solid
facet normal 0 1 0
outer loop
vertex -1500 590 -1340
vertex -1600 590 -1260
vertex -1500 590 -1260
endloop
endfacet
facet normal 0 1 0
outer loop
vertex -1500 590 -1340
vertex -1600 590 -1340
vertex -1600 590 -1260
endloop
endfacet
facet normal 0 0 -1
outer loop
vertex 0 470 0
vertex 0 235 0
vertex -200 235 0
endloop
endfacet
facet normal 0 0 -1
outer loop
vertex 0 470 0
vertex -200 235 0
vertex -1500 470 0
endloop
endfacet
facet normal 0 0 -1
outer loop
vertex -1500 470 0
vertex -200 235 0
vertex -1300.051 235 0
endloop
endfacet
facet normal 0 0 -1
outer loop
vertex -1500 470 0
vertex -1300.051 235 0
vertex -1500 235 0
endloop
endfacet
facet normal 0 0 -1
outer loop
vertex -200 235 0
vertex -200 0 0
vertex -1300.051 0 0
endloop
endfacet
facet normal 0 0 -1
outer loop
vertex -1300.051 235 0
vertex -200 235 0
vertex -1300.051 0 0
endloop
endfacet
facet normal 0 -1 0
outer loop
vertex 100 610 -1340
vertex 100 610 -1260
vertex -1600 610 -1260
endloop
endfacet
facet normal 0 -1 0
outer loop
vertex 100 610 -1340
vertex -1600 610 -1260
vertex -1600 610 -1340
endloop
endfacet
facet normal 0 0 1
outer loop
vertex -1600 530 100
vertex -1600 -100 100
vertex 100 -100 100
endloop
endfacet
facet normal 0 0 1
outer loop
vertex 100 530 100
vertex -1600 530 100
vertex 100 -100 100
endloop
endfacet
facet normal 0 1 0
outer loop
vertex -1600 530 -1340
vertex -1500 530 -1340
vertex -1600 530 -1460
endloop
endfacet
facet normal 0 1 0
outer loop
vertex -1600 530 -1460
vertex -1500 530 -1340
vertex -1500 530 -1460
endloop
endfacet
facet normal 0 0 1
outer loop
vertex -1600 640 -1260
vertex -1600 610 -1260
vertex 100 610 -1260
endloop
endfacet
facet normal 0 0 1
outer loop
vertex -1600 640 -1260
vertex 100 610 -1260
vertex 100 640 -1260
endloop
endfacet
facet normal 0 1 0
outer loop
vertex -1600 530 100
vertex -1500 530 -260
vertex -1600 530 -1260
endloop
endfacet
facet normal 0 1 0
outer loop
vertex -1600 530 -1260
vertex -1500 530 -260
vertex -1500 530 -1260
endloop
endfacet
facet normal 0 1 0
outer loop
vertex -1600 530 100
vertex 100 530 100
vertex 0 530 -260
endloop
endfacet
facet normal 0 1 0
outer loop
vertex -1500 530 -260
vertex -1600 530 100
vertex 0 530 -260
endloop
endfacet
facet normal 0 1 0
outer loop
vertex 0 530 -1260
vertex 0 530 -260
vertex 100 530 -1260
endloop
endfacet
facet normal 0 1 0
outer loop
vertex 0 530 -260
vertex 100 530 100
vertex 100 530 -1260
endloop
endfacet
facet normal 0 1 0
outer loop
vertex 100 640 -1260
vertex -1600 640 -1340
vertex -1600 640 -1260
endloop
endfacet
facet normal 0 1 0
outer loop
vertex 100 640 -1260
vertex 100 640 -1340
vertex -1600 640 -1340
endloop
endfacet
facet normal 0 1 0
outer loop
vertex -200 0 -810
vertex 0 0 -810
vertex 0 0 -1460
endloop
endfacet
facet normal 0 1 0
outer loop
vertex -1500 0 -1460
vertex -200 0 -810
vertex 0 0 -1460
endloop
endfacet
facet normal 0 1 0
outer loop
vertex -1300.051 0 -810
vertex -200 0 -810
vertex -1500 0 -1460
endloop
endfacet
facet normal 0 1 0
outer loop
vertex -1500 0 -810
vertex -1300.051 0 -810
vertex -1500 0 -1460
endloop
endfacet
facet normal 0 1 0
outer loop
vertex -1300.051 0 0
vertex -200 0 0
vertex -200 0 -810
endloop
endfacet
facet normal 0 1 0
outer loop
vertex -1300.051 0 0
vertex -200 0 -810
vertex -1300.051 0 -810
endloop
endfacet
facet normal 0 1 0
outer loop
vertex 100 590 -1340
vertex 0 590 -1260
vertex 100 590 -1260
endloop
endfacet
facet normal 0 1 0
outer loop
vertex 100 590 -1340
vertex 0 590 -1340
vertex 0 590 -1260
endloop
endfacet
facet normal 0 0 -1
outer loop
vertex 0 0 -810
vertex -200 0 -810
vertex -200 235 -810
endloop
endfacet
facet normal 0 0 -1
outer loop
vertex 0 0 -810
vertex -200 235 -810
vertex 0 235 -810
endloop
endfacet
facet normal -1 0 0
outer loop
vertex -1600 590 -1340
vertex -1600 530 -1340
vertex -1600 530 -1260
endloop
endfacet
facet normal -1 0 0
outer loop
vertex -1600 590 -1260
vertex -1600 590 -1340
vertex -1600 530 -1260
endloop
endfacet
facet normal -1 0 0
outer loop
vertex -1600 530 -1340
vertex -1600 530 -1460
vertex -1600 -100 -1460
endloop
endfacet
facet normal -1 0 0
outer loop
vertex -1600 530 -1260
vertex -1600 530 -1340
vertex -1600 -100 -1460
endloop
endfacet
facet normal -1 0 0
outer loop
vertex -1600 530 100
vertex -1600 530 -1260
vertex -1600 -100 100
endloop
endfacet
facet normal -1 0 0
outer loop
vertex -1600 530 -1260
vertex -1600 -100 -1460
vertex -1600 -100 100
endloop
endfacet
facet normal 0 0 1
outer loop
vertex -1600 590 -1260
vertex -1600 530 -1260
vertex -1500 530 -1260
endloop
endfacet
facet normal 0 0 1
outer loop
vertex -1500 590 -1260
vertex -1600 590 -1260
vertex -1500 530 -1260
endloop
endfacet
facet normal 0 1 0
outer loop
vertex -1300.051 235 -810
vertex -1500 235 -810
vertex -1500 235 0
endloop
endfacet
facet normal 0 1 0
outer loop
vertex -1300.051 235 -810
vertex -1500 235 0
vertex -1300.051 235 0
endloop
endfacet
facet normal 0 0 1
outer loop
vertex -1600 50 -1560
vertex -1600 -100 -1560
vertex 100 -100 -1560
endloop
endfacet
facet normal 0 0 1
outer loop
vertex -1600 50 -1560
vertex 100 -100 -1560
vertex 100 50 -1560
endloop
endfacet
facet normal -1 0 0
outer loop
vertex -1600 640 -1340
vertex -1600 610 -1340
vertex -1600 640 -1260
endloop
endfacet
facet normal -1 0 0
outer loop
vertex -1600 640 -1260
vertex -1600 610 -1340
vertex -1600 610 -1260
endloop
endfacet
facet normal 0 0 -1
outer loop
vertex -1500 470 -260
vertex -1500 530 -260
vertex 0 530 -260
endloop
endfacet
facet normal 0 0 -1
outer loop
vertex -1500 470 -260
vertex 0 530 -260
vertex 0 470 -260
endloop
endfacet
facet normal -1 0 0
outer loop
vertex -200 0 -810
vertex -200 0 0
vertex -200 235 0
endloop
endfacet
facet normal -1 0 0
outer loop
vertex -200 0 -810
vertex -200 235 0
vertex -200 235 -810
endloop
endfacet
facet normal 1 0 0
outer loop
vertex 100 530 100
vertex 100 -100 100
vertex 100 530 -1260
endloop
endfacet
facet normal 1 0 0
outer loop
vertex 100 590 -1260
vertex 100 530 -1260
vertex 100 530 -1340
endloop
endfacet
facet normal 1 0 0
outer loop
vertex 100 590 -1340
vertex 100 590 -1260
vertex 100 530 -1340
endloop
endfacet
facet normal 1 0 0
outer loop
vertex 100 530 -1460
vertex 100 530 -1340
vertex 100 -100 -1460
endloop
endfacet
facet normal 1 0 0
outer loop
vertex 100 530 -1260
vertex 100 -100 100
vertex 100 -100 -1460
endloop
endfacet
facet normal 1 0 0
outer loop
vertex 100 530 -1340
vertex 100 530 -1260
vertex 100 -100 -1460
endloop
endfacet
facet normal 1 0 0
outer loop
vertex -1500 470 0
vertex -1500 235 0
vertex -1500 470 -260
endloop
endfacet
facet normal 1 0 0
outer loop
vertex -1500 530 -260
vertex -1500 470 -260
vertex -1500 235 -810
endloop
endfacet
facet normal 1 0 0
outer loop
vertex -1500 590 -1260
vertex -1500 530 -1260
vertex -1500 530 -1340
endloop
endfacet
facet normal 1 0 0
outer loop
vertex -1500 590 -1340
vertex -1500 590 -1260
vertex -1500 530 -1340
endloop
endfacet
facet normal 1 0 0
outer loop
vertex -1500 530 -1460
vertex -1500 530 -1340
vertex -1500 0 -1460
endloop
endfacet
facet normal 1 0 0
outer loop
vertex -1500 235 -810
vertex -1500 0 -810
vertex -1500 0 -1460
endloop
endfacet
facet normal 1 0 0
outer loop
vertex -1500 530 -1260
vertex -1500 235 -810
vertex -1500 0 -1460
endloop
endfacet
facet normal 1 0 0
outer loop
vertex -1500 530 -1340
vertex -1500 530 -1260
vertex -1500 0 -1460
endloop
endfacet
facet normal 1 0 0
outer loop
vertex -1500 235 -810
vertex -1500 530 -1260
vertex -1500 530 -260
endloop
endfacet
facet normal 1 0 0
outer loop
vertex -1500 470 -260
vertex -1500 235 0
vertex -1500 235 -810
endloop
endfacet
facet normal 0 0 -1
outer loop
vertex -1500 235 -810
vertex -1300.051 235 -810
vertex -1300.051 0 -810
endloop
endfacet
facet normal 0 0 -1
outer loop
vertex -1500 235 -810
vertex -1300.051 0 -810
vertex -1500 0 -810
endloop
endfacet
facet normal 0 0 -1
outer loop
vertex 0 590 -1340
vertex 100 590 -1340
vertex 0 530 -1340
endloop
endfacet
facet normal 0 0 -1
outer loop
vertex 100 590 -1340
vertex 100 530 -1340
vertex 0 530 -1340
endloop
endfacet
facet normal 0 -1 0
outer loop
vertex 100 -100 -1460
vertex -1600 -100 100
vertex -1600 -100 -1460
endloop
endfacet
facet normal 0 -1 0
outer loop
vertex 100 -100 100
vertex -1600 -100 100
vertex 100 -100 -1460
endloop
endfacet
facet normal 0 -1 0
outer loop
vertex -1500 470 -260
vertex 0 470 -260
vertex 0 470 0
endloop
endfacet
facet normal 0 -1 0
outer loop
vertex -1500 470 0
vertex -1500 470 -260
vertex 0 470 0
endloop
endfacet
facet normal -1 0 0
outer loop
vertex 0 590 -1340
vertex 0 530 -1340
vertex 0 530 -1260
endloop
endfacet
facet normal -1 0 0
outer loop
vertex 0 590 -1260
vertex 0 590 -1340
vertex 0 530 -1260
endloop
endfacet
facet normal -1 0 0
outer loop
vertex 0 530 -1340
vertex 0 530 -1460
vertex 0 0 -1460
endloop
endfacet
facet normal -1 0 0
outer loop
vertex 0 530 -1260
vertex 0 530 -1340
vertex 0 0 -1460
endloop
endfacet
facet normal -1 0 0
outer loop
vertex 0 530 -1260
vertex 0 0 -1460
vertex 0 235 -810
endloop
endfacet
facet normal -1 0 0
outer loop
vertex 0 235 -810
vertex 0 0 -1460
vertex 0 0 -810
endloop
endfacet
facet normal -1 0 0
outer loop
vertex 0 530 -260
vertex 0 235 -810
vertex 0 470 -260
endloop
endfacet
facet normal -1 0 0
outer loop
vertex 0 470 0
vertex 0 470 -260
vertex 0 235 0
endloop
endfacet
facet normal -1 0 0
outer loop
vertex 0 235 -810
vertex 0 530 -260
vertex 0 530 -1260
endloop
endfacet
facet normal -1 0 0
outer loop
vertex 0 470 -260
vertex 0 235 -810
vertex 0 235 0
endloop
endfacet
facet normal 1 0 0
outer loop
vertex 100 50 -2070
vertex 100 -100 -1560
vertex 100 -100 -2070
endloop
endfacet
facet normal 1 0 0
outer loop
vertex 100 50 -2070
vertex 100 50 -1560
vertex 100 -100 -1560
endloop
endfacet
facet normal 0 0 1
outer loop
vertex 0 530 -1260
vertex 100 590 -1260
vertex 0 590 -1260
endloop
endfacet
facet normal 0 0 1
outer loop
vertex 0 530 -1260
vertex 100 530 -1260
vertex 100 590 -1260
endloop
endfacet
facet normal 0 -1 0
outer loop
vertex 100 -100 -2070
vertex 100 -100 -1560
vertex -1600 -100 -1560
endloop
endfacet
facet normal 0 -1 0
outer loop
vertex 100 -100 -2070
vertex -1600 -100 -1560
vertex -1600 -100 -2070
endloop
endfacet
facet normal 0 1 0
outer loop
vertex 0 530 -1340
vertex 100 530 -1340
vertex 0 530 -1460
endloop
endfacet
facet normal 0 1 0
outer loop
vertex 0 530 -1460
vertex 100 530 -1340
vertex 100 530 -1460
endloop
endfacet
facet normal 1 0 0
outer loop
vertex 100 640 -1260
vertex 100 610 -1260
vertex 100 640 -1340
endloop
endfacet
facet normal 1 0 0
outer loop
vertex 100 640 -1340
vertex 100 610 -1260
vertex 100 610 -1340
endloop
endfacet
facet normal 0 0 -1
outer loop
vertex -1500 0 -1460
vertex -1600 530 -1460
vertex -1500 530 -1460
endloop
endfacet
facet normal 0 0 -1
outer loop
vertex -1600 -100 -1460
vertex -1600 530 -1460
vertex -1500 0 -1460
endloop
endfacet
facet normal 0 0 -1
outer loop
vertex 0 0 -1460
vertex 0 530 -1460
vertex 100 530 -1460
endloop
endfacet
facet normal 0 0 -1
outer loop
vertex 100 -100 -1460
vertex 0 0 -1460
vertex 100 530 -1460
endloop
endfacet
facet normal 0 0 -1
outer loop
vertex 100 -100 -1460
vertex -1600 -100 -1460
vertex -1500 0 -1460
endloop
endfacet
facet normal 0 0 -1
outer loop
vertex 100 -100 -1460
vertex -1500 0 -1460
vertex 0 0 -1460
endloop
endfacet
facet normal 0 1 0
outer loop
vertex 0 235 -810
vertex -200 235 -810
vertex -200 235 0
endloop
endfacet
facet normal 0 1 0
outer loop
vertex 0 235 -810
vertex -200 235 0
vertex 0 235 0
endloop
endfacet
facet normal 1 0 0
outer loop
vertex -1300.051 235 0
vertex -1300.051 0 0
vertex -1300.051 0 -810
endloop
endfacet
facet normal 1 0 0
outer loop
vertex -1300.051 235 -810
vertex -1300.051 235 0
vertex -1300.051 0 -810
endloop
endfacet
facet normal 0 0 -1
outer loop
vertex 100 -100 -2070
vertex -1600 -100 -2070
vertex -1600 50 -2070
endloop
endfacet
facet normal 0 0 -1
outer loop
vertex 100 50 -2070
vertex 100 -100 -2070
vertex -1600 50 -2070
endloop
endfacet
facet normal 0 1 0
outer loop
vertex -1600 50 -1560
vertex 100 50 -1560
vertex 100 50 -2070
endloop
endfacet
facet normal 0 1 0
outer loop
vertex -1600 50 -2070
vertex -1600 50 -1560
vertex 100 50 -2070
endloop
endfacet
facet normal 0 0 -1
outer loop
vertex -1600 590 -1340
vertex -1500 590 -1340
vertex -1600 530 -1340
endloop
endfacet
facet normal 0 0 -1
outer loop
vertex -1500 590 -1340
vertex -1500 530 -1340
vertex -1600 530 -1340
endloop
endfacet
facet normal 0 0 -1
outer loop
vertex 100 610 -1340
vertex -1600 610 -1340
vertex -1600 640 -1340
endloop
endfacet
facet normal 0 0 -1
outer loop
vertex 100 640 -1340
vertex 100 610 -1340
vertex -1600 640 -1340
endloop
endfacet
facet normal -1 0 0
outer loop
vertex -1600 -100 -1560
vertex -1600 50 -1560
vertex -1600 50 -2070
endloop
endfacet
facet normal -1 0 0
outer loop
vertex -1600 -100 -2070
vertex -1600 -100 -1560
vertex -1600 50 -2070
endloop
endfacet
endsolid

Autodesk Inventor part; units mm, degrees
ref_plane "YZ Plane" through (0, 0, 0) normal (1, 0, 0) x (0, 1, 0)
ref_plane "XZ Plane" through (0, 0, 0) normal (0, 1, 0) x (-1, 0, 0)
ref_plane "XY Plane" through (0, 0, 0) normal (0, 0, 1) x (1, 0, 0)
sketch "Sketch1" plane through (0, 0, 0) normal (0, 1, 0) x (-1, 0, 0)
  line L0 (0, 0) -> (1500, 0)
  line L1 (1500, 0) -> (1500, -1460)
  line L2 (1500, -1460) -> (0, -1460)
  line L3 (0, -1460) -> (0, 0)
  dimension "d0" = 1500
  dimension "d1" = 1460
extrude "Extrusion1" add sketch "Sketch1" against normal blind 100
sketch "Sketch2" plane through (0, 0, 0) normal (0, 1, 0) x (1, 0, 0)
  line L0 (-1500.0509, 0) -> (-1300.0509, 0)
  line L1 (-1300.0509, 0) -> (-1300.0509, 810)
  line L2 (-1300.0509, 810) -> (-1500.0509, 810)
  line L3 (-1500.0509, 810) -> (-1500.0509, 0)
  line L4 (0, 0) -> (-200, 0)
  line L5 (-200, 0) -> (-200, 810)
  line L6 (-200, 810) -> (0, 810)
  line L7 (0, 810) -> (0, 0)
  dimension "d4" = 200
  dimension "d5" = 810
  dimension "d6" = 200
  dimension "d7" = 810
extrude "Extrusion2" add sketch "Sketch2" along normal blind 235
sketch "Sketch3" plane through (0, -100, 0) normal (0, -1, 0) x (1, 0, 0)
  line L0 (-1500, 0) -> (-1500, -1460) projected
  line L1 (0, 0) -> (-1500, 0)
  line L2 (-1500, 0) -> (-1500, -1460)
  line L3 (-1500, -1460) -> (0, -1460)
  line L4 (0, -1460) -> (0, 0)
  line L5 (-1500, -1460) -> (-1600, -1460)
  line L6 (-1600, -1460) -> (-1600, 0)
  line L7 (-1600, 0) -> (-1500, 0)
  line L8 (-1500, 0) -> (-1500, -1460)
  line L9 (0, -1460) -> (100, -1460)
  line L10 (100, -1460) -> (100, 0)
  line L11 (100, 0) -> (0, 0)
  line L12 (0, 0) -> (0, -1460)
  line L13 (100, 0) -> (-1600, 0)
  line L14 (-1600, 0) -> (-1600, 100)
  line L15 (-1600, 100) -> (100, 100)
  line L16 (100, 100) -> (100, 0)
  dimension "d10" = 100
  dimension "d11" = 100
  dimension "d12" = 1700
  dimension "d13" = 100
extrude "Extrusion3" add sketch "Sketch3" against normal blind 630 contours L7 L14 L15 L16 L11 L1 | L0 L5 L6 L7 | L11 L10 L9 L4
sketch "Sketch4" plane through (0, 0, -1460) normal (-1, 0, 0) x (0, 0, 1)
  line L0 (1460, 530) -> (1200, 530)
  line L1 (1200, 530) -> (1200, 470)
  line L2 (1200, 470) -> (1460, 470)
  line L3 (1460, 470) -> (1460, 530)
  point P0 (1460, 0)
  dimension "d16" = 260
  dimension "d17" = 60
extrude "Extrusion4" add sketch "Sketch4" along normal blind 1500
sketch "Sketch5" plane through (0, 530, 0) normal (0, 1, 0) x (1, 0, 0)
  line L0 (100, 1460) -> (0, 1460) projected
  line L1 (100, -100) -> (100, 1460) projected
  line L2 (0, 1460) -> (100, 1460)
  line L3 (100, 1460) -> (100, 1340)
  line L4 (100, 1340) -> (0, 1340)
  line L5 (0, 1340) -> (0, 1460)
  line L6 (-1500, 1460) -> (-1600, 1460) projected
  line L7 (-1500, 260) -> (-1500, 1460) projected
  line L8 (-1600, 1460) -> (-1500, 1460)
  line L9 (-1500, 1460) -> (-1500, 1340)
  line L10 (-1500, 1340) -> (-1600, 1340)
  line L11 (-1600, 1340) -> (-1600, 1460)
  line L12 (0, 1340) -> (100, 1340)
  line L13 (100, 1340) -> (100, 1260)
  line L14 (100, 1260) -> (0, 1260)
  line L15 (0, 1260) -> (0, 1340)
  line L16 (-1600, 1460) -> (-1600, -100) projected
  line L17 (-1500, 1340) -> (-1600, 1340)
  line L18 (-1600, 1340) -> (-1600, 1260)
  line L19 (-1600, 1260) -> (-1500, 1260)
  line L20 (-1500, 1260) -> (-1500, 1340)
  point P0 (0, 0)
  dimension "d20" = 120
  dimension "d21" = 120
  dimension "d22" = 80
  dimension "d23" = 80
extrude "Extrusion5" add sketch "Sketch5" along normal blind 110 contours L1 L14 L15 L4 | L7 L19 L16 L10
sketch "Sketch6" plane through (100, 530, -1340) normal (0, 0, -1) x (-1, 0, 0)
  line L0 (0, 0) -> (0, 110) projected
  line L1 (100, 0) -> (100, 110) projected
  line L2 (0, 110) -> (100, 110)
  line L3 (100, 110) -> (100, 80)
  line L4 (100, 80) -> (0, 80)
  line L5 (0, 80) -> (0, 110)
  line L6 (0, 80) -> (1700, 80)
  line L7 (1700, 80) -> (1700, 60)
  line L8 (1700, 60) -> (0, 60)
  line L9 (0, 60) -> (0, 80)
  point P0 (100, -530)
  dimension "d26" = 30
  dimension "d27" = 1700
  dimension "d28" = 20
extrude "Extrusion6" cut sketch "Sketch6" against normal blind 80 contours L0 L4 L1 L8 | L1 L6 L7 L8
sketch "Sketch7" plane through (0, 640, -1340) normal (-1, 0, 0) x (0, 0, 1)
  line L0 (80, -30) -> (80, 0) projected
  line L1 (0, 0) -> (80, 0)
  line L2 (80, 0) -> (80, -30)
  line L3 (80, -30) -> (0, -30)
  line L4 (0, -30) -> (0, 0)
  point P0 (1340, -640)
  dimension "d31" = 80
  dimension "d32" = 30
extrude "Extrusion7" add sketch "Sketch7" along normal blind 1500
sketch "Sketch8" plane through (100, -100, 100) normal (1, 0, 0) x (0, 0, -1)
  line L0 (1560, 0) -> (1560, 630) projected
  line L1 (1560, 0) -> (1660, 0)
  line L2 (1560, 0) -> (1660, 0) construction
  line L3 (1660, 0) -> (1660, 50)
  line L4 (1660, 0) -> (1710, 0) construction
  line L5 (1660, 50) -> (2170, 50)
  line L6 (2170, 50) -> (1660, 50)
  line L7 (1660, 50) -> (1660, 150)
  line L8 (1660, 150) -> (2170, 150)
  line L9 (2170, 150) -> (2170, 50)
  line L10 (2170, 150) -> (1660, 150)
  line L11 (1660, 150) -> (1660, 0)
  line L12 (1660, 0) -> (2170, 0)
  line L13 (2170, 0) -> (2170, 150)
  point P0 (100, 100)
  dimension "d35" = 100
  dimension "d36" = 0
  dimension "d37" = 50
  dimension "d38" = 90
  dimension "d39" = 510
  dimension "d40" = 90
  dimension "d41" = 510
  dimension "d42" = 100
extrude "Extrusion8" add sketch "Sketch8" against normal blind 1700
sketch "Sketch9" plane through (0, 0, 0) normal (0, 1, 0) x (1, 0, 0)
  line L0 (0, 1310) -> (-1500, 1310)
  point P0 (0, 0)
properties part number "0 - Ute"
